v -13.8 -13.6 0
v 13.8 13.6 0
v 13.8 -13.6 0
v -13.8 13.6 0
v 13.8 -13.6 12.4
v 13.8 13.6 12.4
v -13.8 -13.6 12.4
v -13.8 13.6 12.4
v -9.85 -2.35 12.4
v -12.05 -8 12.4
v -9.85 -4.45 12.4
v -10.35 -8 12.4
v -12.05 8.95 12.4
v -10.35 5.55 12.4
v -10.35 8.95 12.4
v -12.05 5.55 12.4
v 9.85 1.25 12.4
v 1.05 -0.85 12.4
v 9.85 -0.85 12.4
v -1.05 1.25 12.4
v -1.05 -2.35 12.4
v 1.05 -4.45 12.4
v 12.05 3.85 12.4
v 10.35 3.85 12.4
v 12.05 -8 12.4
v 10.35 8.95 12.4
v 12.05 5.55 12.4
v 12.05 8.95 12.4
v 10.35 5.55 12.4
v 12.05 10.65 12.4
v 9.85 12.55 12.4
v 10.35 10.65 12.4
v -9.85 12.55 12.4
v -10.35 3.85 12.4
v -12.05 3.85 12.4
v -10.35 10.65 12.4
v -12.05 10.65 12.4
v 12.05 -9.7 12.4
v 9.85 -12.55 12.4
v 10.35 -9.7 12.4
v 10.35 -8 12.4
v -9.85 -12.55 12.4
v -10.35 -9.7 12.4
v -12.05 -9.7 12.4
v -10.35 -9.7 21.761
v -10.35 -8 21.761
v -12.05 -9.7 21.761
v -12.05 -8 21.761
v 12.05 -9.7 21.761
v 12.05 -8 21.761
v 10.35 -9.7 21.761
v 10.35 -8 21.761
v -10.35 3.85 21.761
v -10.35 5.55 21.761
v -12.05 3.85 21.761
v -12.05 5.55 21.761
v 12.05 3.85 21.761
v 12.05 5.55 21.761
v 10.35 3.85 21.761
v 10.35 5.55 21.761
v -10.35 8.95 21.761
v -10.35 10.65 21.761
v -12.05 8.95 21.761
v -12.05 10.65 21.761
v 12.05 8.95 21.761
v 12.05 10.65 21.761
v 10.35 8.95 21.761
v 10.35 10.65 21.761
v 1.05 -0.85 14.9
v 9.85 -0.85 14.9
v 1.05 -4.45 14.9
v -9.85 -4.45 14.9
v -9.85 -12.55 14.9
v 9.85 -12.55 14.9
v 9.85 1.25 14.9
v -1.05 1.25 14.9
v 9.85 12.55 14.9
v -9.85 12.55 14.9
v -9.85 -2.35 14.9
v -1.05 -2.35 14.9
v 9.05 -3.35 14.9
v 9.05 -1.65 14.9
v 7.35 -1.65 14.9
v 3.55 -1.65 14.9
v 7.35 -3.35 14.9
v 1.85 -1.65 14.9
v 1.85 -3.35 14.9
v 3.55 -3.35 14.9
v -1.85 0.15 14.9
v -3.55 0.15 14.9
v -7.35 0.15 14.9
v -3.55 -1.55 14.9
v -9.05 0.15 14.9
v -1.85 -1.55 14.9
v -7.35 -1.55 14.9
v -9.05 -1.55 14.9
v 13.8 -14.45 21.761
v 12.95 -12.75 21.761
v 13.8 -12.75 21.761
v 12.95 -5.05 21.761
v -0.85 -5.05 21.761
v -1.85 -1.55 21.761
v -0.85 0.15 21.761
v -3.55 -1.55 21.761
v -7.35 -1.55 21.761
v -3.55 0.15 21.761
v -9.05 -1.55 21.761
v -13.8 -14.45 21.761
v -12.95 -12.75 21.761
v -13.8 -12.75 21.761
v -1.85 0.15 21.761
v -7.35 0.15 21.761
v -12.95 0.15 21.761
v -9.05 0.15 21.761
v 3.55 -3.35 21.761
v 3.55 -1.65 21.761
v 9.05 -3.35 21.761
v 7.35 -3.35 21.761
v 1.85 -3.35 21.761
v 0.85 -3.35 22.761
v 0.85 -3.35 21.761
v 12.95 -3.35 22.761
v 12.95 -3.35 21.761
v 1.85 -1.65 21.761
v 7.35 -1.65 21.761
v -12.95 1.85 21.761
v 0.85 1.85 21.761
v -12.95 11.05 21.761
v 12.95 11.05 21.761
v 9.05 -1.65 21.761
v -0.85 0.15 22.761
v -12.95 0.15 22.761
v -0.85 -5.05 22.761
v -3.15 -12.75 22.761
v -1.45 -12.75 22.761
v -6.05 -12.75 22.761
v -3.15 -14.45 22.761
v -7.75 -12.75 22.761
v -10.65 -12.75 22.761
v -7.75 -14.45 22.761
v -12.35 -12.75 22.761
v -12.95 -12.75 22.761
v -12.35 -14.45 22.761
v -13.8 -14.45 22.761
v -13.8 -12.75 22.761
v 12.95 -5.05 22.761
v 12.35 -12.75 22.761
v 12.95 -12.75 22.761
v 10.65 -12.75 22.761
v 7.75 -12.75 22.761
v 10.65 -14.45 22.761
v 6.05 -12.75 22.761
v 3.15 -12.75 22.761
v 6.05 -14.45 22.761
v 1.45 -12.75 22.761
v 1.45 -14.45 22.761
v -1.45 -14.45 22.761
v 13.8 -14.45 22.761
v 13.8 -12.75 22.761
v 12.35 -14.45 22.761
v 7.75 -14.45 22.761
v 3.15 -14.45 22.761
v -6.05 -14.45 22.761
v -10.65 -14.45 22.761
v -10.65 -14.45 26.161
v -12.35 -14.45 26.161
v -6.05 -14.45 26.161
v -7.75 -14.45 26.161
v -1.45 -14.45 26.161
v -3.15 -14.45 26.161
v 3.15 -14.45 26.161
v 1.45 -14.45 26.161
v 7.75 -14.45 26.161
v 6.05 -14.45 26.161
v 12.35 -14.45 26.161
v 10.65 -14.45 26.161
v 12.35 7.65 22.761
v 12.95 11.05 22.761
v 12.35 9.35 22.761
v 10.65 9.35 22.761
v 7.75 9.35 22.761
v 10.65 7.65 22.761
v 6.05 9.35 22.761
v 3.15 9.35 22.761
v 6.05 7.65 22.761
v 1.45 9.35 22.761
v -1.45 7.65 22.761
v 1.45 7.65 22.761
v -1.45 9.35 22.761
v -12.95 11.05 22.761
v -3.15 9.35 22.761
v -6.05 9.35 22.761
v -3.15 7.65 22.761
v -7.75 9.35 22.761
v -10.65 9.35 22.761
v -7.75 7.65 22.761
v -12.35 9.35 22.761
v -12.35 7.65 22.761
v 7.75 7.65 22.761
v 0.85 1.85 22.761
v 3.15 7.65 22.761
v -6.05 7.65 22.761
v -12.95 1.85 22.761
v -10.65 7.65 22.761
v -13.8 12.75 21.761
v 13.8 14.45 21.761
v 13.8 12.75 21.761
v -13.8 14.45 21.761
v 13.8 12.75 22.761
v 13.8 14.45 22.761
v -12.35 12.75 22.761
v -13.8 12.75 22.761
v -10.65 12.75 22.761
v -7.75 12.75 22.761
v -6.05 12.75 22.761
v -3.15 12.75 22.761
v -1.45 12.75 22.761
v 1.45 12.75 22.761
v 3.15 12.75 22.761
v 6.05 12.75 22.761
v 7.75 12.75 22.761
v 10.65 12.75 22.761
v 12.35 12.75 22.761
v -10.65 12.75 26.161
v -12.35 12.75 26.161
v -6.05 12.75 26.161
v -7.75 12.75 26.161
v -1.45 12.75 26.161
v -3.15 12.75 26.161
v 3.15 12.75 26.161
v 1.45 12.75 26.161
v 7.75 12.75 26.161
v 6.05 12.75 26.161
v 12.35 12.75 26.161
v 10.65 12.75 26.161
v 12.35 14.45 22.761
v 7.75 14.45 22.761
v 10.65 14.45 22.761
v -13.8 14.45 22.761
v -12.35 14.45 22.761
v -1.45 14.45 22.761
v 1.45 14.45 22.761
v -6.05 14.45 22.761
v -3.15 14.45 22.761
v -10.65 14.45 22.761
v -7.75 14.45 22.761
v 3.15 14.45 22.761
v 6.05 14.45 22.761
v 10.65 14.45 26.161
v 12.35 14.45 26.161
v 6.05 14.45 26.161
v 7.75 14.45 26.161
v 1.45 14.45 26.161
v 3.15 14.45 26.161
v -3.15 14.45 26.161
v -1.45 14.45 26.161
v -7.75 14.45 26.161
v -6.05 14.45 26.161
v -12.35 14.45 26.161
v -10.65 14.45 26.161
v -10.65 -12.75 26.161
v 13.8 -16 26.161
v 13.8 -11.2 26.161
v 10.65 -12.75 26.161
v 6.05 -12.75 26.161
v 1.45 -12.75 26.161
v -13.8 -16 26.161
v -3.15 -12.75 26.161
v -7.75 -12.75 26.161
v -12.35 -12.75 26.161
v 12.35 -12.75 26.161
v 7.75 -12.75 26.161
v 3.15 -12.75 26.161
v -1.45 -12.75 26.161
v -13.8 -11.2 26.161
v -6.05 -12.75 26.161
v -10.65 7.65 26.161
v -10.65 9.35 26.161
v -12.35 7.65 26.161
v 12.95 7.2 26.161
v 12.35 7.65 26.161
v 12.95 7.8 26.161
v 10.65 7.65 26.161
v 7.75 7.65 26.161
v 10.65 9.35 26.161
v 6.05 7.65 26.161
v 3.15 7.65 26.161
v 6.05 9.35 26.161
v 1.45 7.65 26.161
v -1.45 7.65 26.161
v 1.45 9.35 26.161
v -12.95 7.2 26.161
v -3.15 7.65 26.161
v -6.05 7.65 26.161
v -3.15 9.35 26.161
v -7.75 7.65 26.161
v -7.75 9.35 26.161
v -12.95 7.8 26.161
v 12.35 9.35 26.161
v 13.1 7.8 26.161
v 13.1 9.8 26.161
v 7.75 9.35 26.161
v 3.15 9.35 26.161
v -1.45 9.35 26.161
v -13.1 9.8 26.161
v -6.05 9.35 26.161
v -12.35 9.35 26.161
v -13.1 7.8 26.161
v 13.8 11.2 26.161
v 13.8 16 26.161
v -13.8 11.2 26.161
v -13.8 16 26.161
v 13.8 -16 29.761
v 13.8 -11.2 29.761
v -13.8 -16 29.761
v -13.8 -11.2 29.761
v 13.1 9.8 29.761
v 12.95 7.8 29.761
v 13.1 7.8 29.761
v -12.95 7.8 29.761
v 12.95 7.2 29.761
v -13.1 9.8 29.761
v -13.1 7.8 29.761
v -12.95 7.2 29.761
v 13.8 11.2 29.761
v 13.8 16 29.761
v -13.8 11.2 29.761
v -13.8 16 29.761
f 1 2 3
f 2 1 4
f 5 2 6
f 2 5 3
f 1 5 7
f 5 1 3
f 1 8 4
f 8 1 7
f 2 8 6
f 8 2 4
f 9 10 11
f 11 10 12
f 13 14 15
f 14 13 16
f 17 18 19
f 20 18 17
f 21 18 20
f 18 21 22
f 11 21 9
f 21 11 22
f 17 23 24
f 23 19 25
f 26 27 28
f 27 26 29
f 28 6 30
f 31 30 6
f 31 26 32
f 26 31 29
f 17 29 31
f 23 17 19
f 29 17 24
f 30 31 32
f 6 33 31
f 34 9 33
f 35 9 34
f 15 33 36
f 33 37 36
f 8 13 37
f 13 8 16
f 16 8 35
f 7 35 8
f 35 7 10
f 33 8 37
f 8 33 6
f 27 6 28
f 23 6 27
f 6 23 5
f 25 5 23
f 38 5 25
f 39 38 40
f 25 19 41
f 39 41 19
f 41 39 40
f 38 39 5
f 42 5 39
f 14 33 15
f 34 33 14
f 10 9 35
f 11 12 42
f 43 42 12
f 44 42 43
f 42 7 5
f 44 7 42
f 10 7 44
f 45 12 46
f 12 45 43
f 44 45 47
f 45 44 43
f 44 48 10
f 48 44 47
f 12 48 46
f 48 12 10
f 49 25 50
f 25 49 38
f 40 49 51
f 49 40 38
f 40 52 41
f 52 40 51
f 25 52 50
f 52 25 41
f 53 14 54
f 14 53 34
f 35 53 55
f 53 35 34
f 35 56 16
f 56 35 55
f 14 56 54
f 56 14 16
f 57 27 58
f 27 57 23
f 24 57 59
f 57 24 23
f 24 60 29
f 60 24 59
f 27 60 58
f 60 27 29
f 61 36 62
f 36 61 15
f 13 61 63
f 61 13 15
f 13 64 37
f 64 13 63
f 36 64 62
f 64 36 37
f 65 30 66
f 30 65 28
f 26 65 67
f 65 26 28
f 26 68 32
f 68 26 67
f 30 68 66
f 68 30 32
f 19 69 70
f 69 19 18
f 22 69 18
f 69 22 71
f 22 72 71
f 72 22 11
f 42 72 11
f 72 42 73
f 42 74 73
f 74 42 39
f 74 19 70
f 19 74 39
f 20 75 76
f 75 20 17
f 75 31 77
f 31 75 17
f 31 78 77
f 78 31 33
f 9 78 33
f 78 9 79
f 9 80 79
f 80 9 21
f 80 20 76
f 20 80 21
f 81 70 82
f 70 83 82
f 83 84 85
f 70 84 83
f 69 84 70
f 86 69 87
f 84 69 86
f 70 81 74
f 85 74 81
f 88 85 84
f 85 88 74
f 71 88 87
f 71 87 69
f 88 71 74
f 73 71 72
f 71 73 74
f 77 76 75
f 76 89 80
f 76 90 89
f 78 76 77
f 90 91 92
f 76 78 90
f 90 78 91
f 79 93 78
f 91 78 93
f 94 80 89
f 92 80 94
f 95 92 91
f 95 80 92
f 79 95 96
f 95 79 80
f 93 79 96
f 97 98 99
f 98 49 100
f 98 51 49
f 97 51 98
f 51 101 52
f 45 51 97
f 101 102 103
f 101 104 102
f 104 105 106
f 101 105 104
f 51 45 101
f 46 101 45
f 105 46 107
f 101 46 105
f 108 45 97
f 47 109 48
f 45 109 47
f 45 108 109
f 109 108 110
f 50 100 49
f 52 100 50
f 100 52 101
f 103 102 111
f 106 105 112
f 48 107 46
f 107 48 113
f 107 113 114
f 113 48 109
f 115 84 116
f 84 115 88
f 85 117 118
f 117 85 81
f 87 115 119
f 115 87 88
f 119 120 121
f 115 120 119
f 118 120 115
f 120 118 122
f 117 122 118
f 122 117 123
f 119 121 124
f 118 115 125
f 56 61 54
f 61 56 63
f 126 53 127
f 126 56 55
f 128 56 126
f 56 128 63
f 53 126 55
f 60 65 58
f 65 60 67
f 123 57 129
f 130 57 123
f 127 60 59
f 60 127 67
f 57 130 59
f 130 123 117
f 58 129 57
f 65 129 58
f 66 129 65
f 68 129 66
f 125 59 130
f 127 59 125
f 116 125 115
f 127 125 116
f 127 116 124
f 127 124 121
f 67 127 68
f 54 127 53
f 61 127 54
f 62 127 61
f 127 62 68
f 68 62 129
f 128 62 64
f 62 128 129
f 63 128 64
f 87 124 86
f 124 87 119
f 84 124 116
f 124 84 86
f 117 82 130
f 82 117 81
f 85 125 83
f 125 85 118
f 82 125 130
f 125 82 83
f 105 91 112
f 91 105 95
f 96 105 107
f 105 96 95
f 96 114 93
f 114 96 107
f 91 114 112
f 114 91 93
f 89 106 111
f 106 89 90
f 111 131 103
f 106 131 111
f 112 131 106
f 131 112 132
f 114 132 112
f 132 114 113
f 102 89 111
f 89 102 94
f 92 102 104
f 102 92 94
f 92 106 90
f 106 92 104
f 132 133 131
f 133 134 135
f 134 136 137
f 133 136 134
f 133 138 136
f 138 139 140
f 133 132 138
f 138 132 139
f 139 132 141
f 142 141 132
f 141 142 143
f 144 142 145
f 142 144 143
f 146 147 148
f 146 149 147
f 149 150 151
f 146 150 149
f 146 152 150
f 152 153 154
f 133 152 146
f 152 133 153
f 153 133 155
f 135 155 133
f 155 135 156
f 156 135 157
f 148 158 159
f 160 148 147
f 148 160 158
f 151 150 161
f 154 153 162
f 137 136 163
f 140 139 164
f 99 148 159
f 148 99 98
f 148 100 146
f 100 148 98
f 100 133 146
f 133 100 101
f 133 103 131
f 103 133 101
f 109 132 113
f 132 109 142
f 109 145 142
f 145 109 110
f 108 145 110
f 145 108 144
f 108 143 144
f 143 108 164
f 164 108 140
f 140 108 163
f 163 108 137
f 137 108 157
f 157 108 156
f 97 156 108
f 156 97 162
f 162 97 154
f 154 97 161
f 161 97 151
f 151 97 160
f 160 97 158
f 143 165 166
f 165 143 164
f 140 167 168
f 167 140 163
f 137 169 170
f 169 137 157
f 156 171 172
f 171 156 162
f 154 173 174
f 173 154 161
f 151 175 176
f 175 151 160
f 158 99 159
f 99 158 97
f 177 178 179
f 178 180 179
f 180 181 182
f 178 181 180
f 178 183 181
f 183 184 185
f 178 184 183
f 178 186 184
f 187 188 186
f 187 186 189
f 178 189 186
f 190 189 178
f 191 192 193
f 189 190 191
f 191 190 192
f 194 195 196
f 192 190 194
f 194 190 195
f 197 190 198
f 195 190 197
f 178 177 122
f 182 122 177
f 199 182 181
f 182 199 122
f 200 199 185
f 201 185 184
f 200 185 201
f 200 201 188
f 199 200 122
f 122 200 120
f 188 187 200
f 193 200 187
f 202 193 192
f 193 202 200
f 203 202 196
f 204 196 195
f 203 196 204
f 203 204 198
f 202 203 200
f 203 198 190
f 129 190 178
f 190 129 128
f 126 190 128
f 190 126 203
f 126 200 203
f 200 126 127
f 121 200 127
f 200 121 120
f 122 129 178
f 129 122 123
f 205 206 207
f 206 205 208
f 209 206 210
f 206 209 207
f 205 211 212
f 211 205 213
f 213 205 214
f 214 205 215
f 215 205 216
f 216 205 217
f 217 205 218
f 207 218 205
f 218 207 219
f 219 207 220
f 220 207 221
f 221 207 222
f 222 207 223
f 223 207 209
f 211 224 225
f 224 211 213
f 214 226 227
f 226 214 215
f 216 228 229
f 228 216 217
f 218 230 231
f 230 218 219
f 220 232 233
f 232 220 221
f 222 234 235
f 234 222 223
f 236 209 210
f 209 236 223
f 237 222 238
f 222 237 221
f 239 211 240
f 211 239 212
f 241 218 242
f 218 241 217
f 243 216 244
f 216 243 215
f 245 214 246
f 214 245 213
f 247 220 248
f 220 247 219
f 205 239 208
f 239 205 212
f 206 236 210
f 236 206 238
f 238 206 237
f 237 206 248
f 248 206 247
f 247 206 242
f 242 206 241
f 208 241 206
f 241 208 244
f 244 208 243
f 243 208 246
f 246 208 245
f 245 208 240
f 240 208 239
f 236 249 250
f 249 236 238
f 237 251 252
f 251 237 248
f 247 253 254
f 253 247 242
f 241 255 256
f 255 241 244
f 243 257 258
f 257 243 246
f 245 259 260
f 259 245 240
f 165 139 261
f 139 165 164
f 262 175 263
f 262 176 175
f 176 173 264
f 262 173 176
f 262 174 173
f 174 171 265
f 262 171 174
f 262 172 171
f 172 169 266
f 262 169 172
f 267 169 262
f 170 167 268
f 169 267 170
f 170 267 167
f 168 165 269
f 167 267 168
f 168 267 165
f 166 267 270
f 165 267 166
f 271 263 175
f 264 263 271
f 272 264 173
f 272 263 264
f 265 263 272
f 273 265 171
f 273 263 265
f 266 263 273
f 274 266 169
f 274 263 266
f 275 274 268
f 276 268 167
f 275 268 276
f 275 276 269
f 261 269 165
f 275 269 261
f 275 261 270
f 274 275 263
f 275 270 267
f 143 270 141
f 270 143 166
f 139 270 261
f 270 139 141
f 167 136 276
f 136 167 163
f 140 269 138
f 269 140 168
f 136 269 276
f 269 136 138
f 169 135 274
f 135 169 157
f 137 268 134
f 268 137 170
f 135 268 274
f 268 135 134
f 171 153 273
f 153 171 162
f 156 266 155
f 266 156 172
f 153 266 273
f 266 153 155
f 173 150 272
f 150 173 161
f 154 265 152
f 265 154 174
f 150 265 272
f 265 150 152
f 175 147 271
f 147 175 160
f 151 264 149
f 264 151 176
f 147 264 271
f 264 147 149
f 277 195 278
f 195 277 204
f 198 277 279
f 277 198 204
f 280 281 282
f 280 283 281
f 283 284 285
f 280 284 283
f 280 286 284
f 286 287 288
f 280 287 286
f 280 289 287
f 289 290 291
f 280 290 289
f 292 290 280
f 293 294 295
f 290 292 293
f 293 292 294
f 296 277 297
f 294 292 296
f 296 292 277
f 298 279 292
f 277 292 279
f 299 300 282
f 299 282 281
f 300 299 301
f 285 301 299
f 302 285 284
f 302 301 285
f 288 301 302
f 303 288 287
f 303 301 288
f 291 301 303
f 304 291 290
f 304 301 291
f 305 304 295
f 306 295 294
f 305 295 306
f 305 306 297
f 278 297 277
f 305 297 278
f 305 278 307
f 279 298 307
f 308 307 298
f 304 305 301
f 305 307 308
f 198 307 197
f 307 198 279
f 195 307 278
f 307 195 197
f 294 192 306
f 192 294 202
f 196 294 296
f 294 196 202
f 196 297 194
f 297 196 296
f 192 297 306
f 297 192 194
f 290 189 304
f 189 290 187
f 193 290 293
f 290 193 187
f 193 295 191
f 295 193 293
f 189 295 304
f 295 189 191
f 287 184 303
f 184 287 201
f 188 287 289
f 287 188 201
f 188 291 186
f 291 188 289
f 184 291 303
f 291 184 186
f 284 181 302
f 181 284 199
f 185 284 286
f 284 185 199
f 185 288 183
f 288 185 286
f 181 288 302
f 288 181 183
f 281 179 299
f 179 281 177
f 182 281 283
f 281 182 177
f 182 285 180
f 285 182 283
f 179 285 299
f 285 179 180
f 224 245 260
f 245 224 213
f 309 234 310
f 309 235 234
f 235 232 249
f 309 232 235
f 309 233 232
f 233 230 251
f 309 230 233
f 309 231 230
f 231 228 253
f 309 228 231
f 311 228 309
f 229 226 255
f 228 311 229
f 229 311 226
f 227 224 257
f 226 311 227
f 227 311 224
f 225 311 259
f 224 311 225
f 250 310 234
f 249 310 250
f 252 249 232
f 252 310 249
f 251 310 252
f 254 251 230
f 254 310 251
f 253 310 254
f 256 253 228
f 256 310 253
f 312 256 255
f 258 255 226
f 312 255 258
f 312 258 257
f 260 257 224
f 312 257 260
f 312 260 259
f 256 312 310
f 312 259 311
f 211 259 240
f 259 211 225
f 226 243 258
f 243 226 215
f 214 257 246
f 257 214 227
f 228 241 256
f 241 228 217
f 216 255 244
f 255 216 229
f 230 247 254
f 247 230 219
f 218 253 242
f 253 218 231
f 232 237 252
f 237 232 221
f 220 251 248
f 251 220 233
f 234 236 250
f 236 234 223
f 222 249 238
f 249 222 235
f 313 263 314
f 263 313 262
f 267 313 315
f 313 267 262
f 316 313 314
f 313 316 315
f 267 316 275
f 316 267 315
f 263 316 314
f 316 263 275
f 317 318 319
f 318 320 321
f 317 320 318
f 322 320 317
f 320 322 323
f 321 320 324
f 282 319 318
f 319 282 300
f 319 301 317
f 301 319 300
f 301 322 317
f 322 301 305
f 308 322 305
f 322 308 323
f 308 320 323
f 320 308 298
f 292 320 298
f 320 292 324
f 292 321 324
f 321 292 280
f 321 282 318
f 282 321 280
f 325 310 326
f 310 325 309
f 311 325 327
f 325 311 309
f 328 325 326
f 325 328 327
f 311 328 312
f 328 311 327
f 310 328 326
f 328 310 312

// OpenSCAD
// Generated by SolidPython 0.4.2 on 2020-09-29 23:21:06
//!OpenSCAD

scale(v = 0.0100000000) {
	translate(v = [-1380, -1360, 0]) {
		union() {
			color(c = [0.4000000000, 0.4000000000, 0.4000000000]) {
				translate(v = [0, 0, 0]) {
					linear_extrude(height = 1000.0000000000) {
						polygon(paths = [[0, 1, 2, 3]], points = [[0, 0], [0, 2720], [2760, 2720], [2760, 0]]);
					}
				}
			}
			color(c = [0.2000000000, 0.6000000000, 0.2000000000]) {
				translate(v = [0, 0, 1000.0000000000]) {
					linear_extrude(height = 120.0000000000) {
						polygon(paths = [[0, 1, 2, 3]], points = [[0, 1305], [0, 2720], [2760, 2720], [2760, 1305]]);
					}
				}
			}
			color(c = [0.4000000000, 0.4000000000, 0.4000000000]) {
				translate(v = [0, 0, 1000.0000000000]) {
					linear_extrude(height = 120.0000000000) {
						polygon(paths = [[0, 1, 2, 3]], points = [[0, 0], [0, 1305], [2760, 1305], [2760, 0]]);
					}
				}
			}
			color(c = [0.9000000000, 0.6000000000, 0.6000000000]) {
				translate(v = [0, 0, 1120.0000000000]) {
					linear_extrude(height = 120.0000000000) {
						polygon(paths = [[0, 1, 2, 3]], points = [[135, 1615], [135, 2485], [395, 2485], [395, 1615]]);
					}
				}
			}
			color(c = [0.9000000000, 0.6000000000, 0.6000000000]) {
				translate(v = [0, 0, 1120.0000000000]) {
					linear_extrude(height = 120.0000000000) {
						polygon(paths = [[0, 1, 2, 3]], points = [[2365, 1615], [2365, 2485], [2625, 2485], [2625, 1615]]);
					}
				}
			}
			color(c = [0.9000000000, 0.6000000000, 0.9000000000]) {
				translate(v = [0, 0, 1120.0000000000]) {
					linear_extrude(height = 120.0000000000) {
						polygon(paths = [[0, 1, 2, 3]], points = [[135, 235], [135, 785], [395, 785], [395, 235]]);
					}
				}
			}
			color(c = [0.9000000000, 0.6000000000, 0.9000000000]) {
				translate(v = [0, 0, 1120.0000000000]) {
					linear_extrude(height = 120.0000000000) {
						polygon(paths = [[0, 1, 2, 3]], points = [[2365, 235], [2365, 785], [2625, 785], [2625, 235]]);
					}
				}
			}
			color(c = [0.2000000000, 0.6000000000, 0.2000000000]) {
				translate(v = [0, 0, 1120.0000000000]) {
					linear_extrude(height = 120.0000000000) {
						difference() {
							polygon(paths = [[0, 1, 2, 3]], points = [[0, 1305], [0, 2720], [2760, 2720], [2760, 1305]]);
							polygon(paths = [[0, 1, 2, 3]], points = [[135, 1615], [395, 1615], [395, 2485], [135, 2485]]);
							polygon(paths = [[0, 1, 2, 3]], points = [[2365, 1615], [2625, 1615], [2625, 2485], [2365, 2485]]);
						}
					}
				}
			}
			color(c = [0.4000000000, 0.4000000000, 0.4000000000]) {
				translate(v = [0, 0, 1120.0000000000]) {
					linear_extrude(height = 120.0000000000) {
						difference() {
							polygon(paths = [[0, 1, 2, 3]], points = [[0, 0], [0, 1305], [2760, 1305], [2760, 0]]);
							polygon(paths = [[0, 1, 2, 3]], points = [[135, 235], [395, 235], [395, 785], [135, 785]]);
							polygon(paths = [[0, 1, 2, 3]], points = [[2365, 235], [2625, 235], [2625, 785], [2365, 785]]);
						}
					}
				}
			}
			color(c = [0.1000000000, 0.1000000000, 0.1000000000]) {
				translate(v = [0, 0, 1240.0000000000]) {
					linear_extrude(height = 70.0000000000) {
						polygon(paths = [[0, 1, 2, 3]], points = [[175, 390], [175, 560], [345, 560], [345, 390]]);
					}
				}
			}
			color(c = [0.1000000000, 0.1000000000, 0.1000000000]) {
				translate(v = [0, 0, 1240.0000000000]) {
					linear_extrude(height = 70.0000000000) {
						polygon(paths = [[0, 1, 2, 3]], points = [[2415, 390], [2415, 560], [2585, 560], [2585, 390]]);
					}
				}
			}
			color(c = [0.1000000000, 0.1000000000, 0.1000000000]) {
				translate(v = [0, 0, 1240.0000000000]) {
					linear_extrude(height = 70.0000000000) {
						polygon(paths = [[0, 1, 2, 3]], points = [[175, 1745], [175, 1915], [345, 1915], [345, 1745]]);
					}
				}
			}
			color(c = [0.1000000000, 0.1000000000, 0.1000000000]) {
				translate(v = [0, 0, 1240.0000000000]) {
					linear_extrude(height = 70.0000000000) {
						polygon(paths = [[0, 1, 2, 3]], points = [[2415, 1745], [2415, 1915], [2585, 1915], [2585, 1745]]);
					}
				}
			}
			color(c = [0.1000000000, 0.1000000000, 0.1000000000]) {
				translate(v = [0, 0, 1240.0000000000]) {
					linear_extrude(height = 70.0000000000) {
						polygon(paths = [[0, 1, 2, 3]], points = [[175, 2255], [175, 2425], [345, 2425], [345, 2255]]);
					}
				}
			}
			color(c = [0.1000000000, 0.1000000000, 0.1000000000]) {
				translate(v = [0, 0, 1240.0000000000]) {
					linear_extrude(height = 70.0000000000) {
						polygon(paths = [[0, 1, 2, 3]], points = [[2415, 2255], [2415, 2425], [2585, 2425], [2585, 2255]]);
					}
				}
			}
			color(c = [1.0000000000, 1.0000000000, 1.0000000000]) {
				translate(v = [0, 0, 1240.0000000000]) {
					linear_extrude(height = 70.0000000000) {
						polygon(paths = [[0, 1, 2, 3, 4, 5]], points = [[395, 105], [395, 915], [1485, 915], [1485, 1275], [2365, 1275], [2365, 105]]);
					}
				}
			}
			color(c = [1.0000000000, 1.0000000000, 1.0000000000]) {
				translate(v = [0, 0, 1240.0000000000]) {
					linear_extrude(height = 70.0000000000) {
						polygon(paths = [[0, 1, 2, 3, 4, 5]], points = [[395, 1125], [395, 2615], [2365, 2615], [2365, 1485], [1275, 1485], [1275, 1125]]);
					}
				}
			}
			color(c = [0.1000000000, 0.1000000000, 0.1000000000]) {
				translate(v = [0, 0, 1310.0000000000]) {
					linear_extrude(height = 180.0000000000) {
						polygon(paths = [[0, 1, 2, 3]], points = [[175, 390], [175, 560], [345, 560], [345, 390]]);
					}
				}
			}
			color(c = [0.1000000000, 0.1000000000, 0.1000000000]) {
				translate(v = [0, 0, 1310.0000000000]) {
					linear_extrude(height = 180.0000000000) {
						polygon(paths = [[0, 1, 2, 3]], points = [[2415, 390], [2415, 560], [2585, 560], [2585, 390]]);
					}
				}
			}
			color(c = [0.1000000000, 0.1000000000, 0.1000000000]) {
				translate(v = [0, 0, 1310.0000000000]) {
					linear_extrude(height = 180.0000000000) {
						polygon(paths = [[0, 1, 2, 3]], points = [[175, 1745], [175, 1915], [345, 1915], [345, 1745]]);
					}
				}
			}
			color(c = [0.1000000000, 0.1000000000, 0.1000000000]) {
				translate(v = [0, 0, 1310.0000000000]) {
					linear_extrude(height = 180.0000000000) {
						polygon(paths = [[0, 1, 2, 3]], points = [[2415, 1745], [2415, 1915], [2585, 1915], [2585, 1745]]);
					}
				}
			}
			color(c = [0.1000000000, 0.1000000000, 0.1000000000]) {
				translate(v = [0, 0, 1310.0000000000]) {
					linear_extrude(height = 180.0000000000) {
						polygon(paths = [[0, 1, 2, 3]], points = [[175, 2255], [175, 2425], [345, 2425], [345, 2255]]);
					}
				}
			}
			color(c = [0.1000000000, 0.1000000000, 0.1000000000]) {
				translate(v = [0, 0, 1310.0000000000]) {
					linear_extrude(height = 180.0000000000) {
						polygon(paths = [[0, 1, 2, 3]], points = [[2415, 2255], [2415, 2425], [2585, 2425], [2585, 2255]]);
					}
				}
			}
			color(c = [0.7000000000, 0, 0]) {
				translate(v = [0, 0, 1310.0000000000]) {
					linear_extrude(height = 180.0000000000) {
						polygon(paths = [[0, 1, 2, 3, 4, 5]], points = [[395, 105], [395, 915], [1485, 915], [1485, 1275], [2365, 1275], [2365, 105]]);
					}
				}
			}
			color(c = [0.7000000000, 0, 0]) {
				translate(v = [0, 0, 1310.0000000000]) {
					linear_extrude(height = 180.0000000000) {
						polygon(paths = [[0, 1, 2, 3, 4, 5]], points = [[395, 1125], [395, 2615], [2365, 2615], [2365, 1485], [1275, 1485], [1275, 1125]]);
					}
				}
			}
			color(c = [0.1000000000, 0.1000000000, 0.1000000000]) {
				translate(v = [0, 0, 1490.0000000000]) {
					linear_extrude(height = 686.1000000000) {
						polygon(paths = [[0, 1, 2, 3]], points = [[175, 390], [175, 560], [345, 560], [345, 390]]);
					}
				}
			}
			color(c = [0.1000000000, 0.1000000000, 0.1000000000]) {
				translate(v = [0, 0, 1490.0000000000]) {
					linear_extrude(height = 686.1000000000) {
						polygon(paths = [[0, 1, 2, 3]], points = [[2415, 390], [2415, 560], [2585, 560], [2585, 390]]);
					}
				}
			}
			color(c = [0.1000000000, 0.1000000000, 0.1000000000]) {
				translate(v = [0, 0, 1490.0000000000]) {
					linear_extrude(height = 686.1000000000) {
						polygon(paths = [[0, 1, 2, 3]], points = [[1565, 1025], [1565, 1195], [1735, 1195], [1735, 1025]]);
					}
				}
			}
			color(c = [0.1000000000, 0.1000000000, 0.1000000000]) {
				translate(v = [0, 0, 1490.0000000000]) {
					linear_extrude(height = 686.1000000000) {
						polygon(paths = [[0, 1, 2, 3]], points = [[2115, 1025], [2115, 1195], [2285, 1195], [2285, 1025]]);
					}
				}
			}
			color(c = [0.1000000000, 0.1000000000, 0.1000000000]) {
				translate(v = [0, 0, 1490.0000000000]) {
					linear_extrude(height = 686.1000000000) {
						polygon(paths = [[0, 1, 2, 3]], points = [[475, 1205], [475, 1375], [645, 1375], [645, 1205]]);
					}
				}
			}
			color(c = [0.1000000000, 0.1000000000, 0.1000000000]) {
				translate(v = [0, 0, 1490.0000000000]) {
					linear_extrude(height = 686.1000000000) {
						polygon(paths = [[0, 1, 2, 3]], points = [[1025, 1205], [1025, 1375], [1195, 1375], [1195, 1205]]);
					}
				}
			}
			color(c = [0.1000000000, 0.1000000000, 0.1000000000]) {
				translate(v = [0, 0, 1490.0000000000]) {
					linear_extrude(height = 686.1000000000) {
						polygon(paths = [[0, 1, 2, 3]], points = [[175, 1745], [175, 1915], [345, 1915], [345, 1745]]);
					}
				}
			}
			color(c = [0.1000000000, 0.1000000000, 0.1000000000]) {
				translate(v = [0, 0, 1490.0000000000]) {
					linear_extrude(height = 686.1000000000) {
						polygon(paths = [[0, 1, 2, 3]], points = [[2415, 1745], [2415, 1915], [2585, 1915], [2585, 1745]]);
					}
				}
			}
			color(c = [0.1000000000, 0.1000000000, 0.1000000000]) {
				translate(v = [0, 0, 1490.0000000000]) {
					linear_extrude(height = 686.1000000000) {
						polygon(paths = [[0, 1, 2, 3]], points = [[175, 2255], [175, 2425], [345, 2425], [345, 2255]]);
					}
				}
			}
			color(c = [0.1000000000, 0.1000000000, 0.1000000000]) {
				translate(v = [0, 0, 1490.0000000000]) {
					linear_extrude(height = 686.1000000000) {
						polygon(paths = [[0, 1, 2, 3]], points = [[2415, 2255], [2415, 2425], [2585, 2425], [2585, 2255]]);
					}
				}
			}
			color(c = [0.9000000000, 0.6000000000, 0.6000000000]) {
				translate(v = [0, 0, 2176.1000000000]) {
					linear_extrude(height = 100.0000000000) {
						polygon(paths = [[0, 1, 2, 3, 4, 5, 6, 7, 8, 9]], points = [[0, -85], [0, 85], [85, 85], [85, 1375], [1295, 1375], [1295, 855], [2675, 855], [2675, 85], [2760, 85], [2760, -85]]);
					}
				}
			}
			color(c = [0.9000000000, 0.6000000000, 0.6000000000]) {
				translate(v = [0, 0, 2176.1000000000]) {
					linear_extrude(height = 100.0000000000) {
						polygon(paths = [[0, 1, 2, 3, 4, 5]], points = [[1465, 1025], [1465, 1545], [85, 1545], [85, 2465], [2675, 2465], [2675, 1025]]);
					}
				}
			}
			color(c = [0.9000000000, 0.6000000000, 0.6000000000]) {
				translate(v = [0, 0, 2176.1000000000]) {
					linear_extrude(height = 100.0000000000) {
						polygon(paths = [[0, 1, 2, 3]], points = [[0, 2635], [0, 2805], [2760, 2805], [2760, 2635]]);
					}
				}
			}
			color(c = [0.5000000000, 0.5000000000, 0.5000000000]) {
				translate(v = [0, 0, 2276.1000000000]) {
					linear_extrude(height = 340.0000000000) {
						polygon(paths = [[0, 1, 2, 3]], points = [[145, -85], [145, 85], [315, 85], [315, -85]]);
					}
				}
			}
			color(c = [0.5000000000, 0.5000000000, 0.5000000000]) {
				translate(v = [0, 0, 2276.1000000000]) {
					linear_extrude(height = 340.0000000000) {
						polygon(paths = [[0, 1, 2, 3]], points = [[605, -85], [605, 85], [775, 85], [775, -85]]);
					}
				}
			}
			color(c = [0.5000000000, 0.5000000000, 0.5000000000]) {
				translate(v = [0, 0, 2276.1000000000]) {
					linear_extrude(height = 340.0000000000) {
						polygon(paths = [[0, 1, 2, 3]], points = [[1065, -85], [1065, 85], [1235, 85], [1235, -85]]);
					}
				}
			}
			color(c = [0.5000000000, 0.5000000000, 0.5000000000]) {
				translate(v = [0, 0, 2276.1000000000]) {
					linear_extrude(height = 340.0000000000) {
						polygon(paths = [[0, 1, 2, 3]], points = [[1525, -85], [1525, 85], [1695, 85], [1695, -85]]);
					}
				}
			}
			color(c = [0.5000000000, 0.5000000000, 0.5000000000]) {
				translate(v = [0, 0, 2276.1000000000]) {
					linear_extrude(height = 340.0000000000) {
						polygon(paths = [[0, 1, 2, 3]], points = [[1985, -85], [1985, 85], [2155, 85], [2155, -85]]);
					}
				}
			}
			color(c = [0.5000000000, 0.5000000000, 0.5000000000]) {
				translate(v = [0, 0, 2276.1000000000]) {
					linear_extrude(height = 340.0000000000) {
						polygon(paths = [[0, 1, 2, 3]], points = [[2445, -85], [2445, 85], [2615, 85], [2615, -85]]);
					}
				}
			}
			color(c = [0.5000000000, 0.5000000000, 0.5000000000]) {
				translate(v = [0, 0, 2276.1000000000]) {
					linear_extrude(height = 340.0000000000) {
						polygon(paths = [[0, 1, 2, 3]], points = [[145, 2125], [145, 2295], [315, 2295], [315, 2125]]);
					}
				}
			}
			color(c = [0.5000000000, 0.5000000000, 0.5000000000]) {
				translate(v = [0, 0, 2276.1000000000]) {
					linear_extrude(height = 340.0000000000) {
						polygon(paths = [[0, 1, 2, 3]], points = [[605, 2125], [605, 2295], [775, 2295], [775, 2125]]);
					}
				}
			}
			color(c = [0.5000000000, 0.5000000000, 0.5000000000]) {
				translate(v = [0, 0, 2276.1000000000]) {
					linear_extrude(height = 340.0000000000) {
						polygon(paths = [[0, 1, 2, 3]], points = [[1065, 2125], [1065, 2295], [1235, 2295], [1235, 2125]]);
					}
				}
			}
			color(c = [0.5000000000, 0.5000000000, 0.5000000000]) {
				translate(v = [0, 0, 2276.1000000000]) {
					linear_extrude(height = 340.0000000000) {
						polygon(paths = [[0, 1, 2, 3]], points = [[1525, 2125], [1525, 2295], [1695, 2295], [1695, 2125]]);
					}
				}
			}
			color(c = [0.5000000000, 0.5000000000, 0.5000000000]) {
				translate(v = [0, 0, 2276.1000000000]) {
					linear_extrude(height = 340.0000000000) {
						polygon(paths = [[0, 1, 2, 3]], points = [[1985, 2125], [1985, 2295], [2155, 2295], [2155, 2125]]);
					}
				}
			}
			color(c = [0.5000000000, 0.5000000000, 0.5000000000]) {
				translate(v = [0, 0, 2276.1000000000]) {
					linear_extrude(height = 340.0000000000) {
						polygon(paths = [[0, 1, 2, 3]], points = [[2445, 2125], [2445, 2295], [2615, 2295], [2615, 2125]]);
					}
				}
			}
			color(c = [0.5000000000, 0.5000000000, 0.5000000000]) {
				translate(v = [0, 0, 2276.1000000000]) {
					linear_extrude(height = 340.0000000000) {
						polygon(paths = [[0, 1, 2, 3]], points = [[145, 2635], [145, 2805], [315, 2805], [315, 2635]]);
					}
				}
			}
			color(c = [0.5000000000, 0.5000000000, 0.5000000000]) {
				translate(v = [0, 0, 2276.1000000000]) {
					linear_extrude(height = 340.0000000000) {
						polygon(paths = [[0, 1, 2, 3]], points = [[605, 2635], [605, 2805], [775, 2805], [775, 2635]]);
					}
				}
			}
			color(c = [0.5000000000, 0.5000000000, 0.5000000000]) {
				translate(v = [0, 0, 2276.1000000000]) {
					linear_extrude(height = 340.0000000000) {
						polygon(paths = [[0, 1, 2, 3]], points = [[1065, 2635], [1065, 2805], [1235, 2805], [1235, 2635]]);
					}
				}
			}
			color(c = [0.5000000000, 0.5000000000, 0.5000000000]) {
				translate(v = [0, 0, 2276.1000000000]) {
					linear_extrude(height = 340.0000000000) {
						polygon(paths = [[0, 1, 2, 3]], points = [[1525, 2635], [1525, 2805], [1695, 2805], [1695, 2635]]);
					}
				}
			}
			color(c = [0.5000000000, 0.5000000000, 0.5000000000]) {
				translate(v = [0, 0, 2276.1000000000]) {
					linear_extrude(height = 340.0000000000) {
						polygon(paths = [[0, 1, 2, 3]], points = [[1985, 2635], [1985, 2805], [2155, 2805], [2155, 2635]]);
					}
				}
			}
			color(c = [0.5000000000, 0.5000000000, 0.5000000000]) {
				translate(v = [0, 0, 2276.1000000000]) {
					linear_extrude(height = 340.0000000000) {
						polygon(paths = [[0, 1, 2, 3]], points = [[2445, 2635], [2445, 2805], [2615, 2805], [2615, 2635]]);
					}
				}
			}
			color(c = [0.3000000000, 0.3000000000, 1]) {
				translate(v = [0, 0, 2616.1000000000]) {
					linear_extrude(height = 360.0000000000) {
						polygon(paths = [[0, 1, 2, 3]], points = [[0, -240], [0, 240], [2760, 240], [2760, -240]]);
					}
				}
			}
			color(c = [0.3000000000, 0.3000000000, 1]) {
				translate(v = [0, 0, 2616.1000000000]) {
					linear_extrude(height = 360.0000000000) {
						polygon(paths = [[0, 1, 2, 3, 4, 5, 6, 7]], points = [[85, 2080], [85, 2140], [70, 2140], [70, 2340], [2690, 2340], [2690, 2140], [2675, 2140], [2675, 2080]]);
					}
				}
			}
			color(c = [0.3000000000, 0.3000000000, 1]) {
				translate(v = [0, 0, 2616.1000000000]) {
					linear_extrude(height = 360.0000000000) {
						polygon(paths = [[0, 1, 2, 3]], points = [[0, 2480], [0, 2960], [2760, 2960], [2760, 2480]]);
					}
				}
			}
		}
	}
}
